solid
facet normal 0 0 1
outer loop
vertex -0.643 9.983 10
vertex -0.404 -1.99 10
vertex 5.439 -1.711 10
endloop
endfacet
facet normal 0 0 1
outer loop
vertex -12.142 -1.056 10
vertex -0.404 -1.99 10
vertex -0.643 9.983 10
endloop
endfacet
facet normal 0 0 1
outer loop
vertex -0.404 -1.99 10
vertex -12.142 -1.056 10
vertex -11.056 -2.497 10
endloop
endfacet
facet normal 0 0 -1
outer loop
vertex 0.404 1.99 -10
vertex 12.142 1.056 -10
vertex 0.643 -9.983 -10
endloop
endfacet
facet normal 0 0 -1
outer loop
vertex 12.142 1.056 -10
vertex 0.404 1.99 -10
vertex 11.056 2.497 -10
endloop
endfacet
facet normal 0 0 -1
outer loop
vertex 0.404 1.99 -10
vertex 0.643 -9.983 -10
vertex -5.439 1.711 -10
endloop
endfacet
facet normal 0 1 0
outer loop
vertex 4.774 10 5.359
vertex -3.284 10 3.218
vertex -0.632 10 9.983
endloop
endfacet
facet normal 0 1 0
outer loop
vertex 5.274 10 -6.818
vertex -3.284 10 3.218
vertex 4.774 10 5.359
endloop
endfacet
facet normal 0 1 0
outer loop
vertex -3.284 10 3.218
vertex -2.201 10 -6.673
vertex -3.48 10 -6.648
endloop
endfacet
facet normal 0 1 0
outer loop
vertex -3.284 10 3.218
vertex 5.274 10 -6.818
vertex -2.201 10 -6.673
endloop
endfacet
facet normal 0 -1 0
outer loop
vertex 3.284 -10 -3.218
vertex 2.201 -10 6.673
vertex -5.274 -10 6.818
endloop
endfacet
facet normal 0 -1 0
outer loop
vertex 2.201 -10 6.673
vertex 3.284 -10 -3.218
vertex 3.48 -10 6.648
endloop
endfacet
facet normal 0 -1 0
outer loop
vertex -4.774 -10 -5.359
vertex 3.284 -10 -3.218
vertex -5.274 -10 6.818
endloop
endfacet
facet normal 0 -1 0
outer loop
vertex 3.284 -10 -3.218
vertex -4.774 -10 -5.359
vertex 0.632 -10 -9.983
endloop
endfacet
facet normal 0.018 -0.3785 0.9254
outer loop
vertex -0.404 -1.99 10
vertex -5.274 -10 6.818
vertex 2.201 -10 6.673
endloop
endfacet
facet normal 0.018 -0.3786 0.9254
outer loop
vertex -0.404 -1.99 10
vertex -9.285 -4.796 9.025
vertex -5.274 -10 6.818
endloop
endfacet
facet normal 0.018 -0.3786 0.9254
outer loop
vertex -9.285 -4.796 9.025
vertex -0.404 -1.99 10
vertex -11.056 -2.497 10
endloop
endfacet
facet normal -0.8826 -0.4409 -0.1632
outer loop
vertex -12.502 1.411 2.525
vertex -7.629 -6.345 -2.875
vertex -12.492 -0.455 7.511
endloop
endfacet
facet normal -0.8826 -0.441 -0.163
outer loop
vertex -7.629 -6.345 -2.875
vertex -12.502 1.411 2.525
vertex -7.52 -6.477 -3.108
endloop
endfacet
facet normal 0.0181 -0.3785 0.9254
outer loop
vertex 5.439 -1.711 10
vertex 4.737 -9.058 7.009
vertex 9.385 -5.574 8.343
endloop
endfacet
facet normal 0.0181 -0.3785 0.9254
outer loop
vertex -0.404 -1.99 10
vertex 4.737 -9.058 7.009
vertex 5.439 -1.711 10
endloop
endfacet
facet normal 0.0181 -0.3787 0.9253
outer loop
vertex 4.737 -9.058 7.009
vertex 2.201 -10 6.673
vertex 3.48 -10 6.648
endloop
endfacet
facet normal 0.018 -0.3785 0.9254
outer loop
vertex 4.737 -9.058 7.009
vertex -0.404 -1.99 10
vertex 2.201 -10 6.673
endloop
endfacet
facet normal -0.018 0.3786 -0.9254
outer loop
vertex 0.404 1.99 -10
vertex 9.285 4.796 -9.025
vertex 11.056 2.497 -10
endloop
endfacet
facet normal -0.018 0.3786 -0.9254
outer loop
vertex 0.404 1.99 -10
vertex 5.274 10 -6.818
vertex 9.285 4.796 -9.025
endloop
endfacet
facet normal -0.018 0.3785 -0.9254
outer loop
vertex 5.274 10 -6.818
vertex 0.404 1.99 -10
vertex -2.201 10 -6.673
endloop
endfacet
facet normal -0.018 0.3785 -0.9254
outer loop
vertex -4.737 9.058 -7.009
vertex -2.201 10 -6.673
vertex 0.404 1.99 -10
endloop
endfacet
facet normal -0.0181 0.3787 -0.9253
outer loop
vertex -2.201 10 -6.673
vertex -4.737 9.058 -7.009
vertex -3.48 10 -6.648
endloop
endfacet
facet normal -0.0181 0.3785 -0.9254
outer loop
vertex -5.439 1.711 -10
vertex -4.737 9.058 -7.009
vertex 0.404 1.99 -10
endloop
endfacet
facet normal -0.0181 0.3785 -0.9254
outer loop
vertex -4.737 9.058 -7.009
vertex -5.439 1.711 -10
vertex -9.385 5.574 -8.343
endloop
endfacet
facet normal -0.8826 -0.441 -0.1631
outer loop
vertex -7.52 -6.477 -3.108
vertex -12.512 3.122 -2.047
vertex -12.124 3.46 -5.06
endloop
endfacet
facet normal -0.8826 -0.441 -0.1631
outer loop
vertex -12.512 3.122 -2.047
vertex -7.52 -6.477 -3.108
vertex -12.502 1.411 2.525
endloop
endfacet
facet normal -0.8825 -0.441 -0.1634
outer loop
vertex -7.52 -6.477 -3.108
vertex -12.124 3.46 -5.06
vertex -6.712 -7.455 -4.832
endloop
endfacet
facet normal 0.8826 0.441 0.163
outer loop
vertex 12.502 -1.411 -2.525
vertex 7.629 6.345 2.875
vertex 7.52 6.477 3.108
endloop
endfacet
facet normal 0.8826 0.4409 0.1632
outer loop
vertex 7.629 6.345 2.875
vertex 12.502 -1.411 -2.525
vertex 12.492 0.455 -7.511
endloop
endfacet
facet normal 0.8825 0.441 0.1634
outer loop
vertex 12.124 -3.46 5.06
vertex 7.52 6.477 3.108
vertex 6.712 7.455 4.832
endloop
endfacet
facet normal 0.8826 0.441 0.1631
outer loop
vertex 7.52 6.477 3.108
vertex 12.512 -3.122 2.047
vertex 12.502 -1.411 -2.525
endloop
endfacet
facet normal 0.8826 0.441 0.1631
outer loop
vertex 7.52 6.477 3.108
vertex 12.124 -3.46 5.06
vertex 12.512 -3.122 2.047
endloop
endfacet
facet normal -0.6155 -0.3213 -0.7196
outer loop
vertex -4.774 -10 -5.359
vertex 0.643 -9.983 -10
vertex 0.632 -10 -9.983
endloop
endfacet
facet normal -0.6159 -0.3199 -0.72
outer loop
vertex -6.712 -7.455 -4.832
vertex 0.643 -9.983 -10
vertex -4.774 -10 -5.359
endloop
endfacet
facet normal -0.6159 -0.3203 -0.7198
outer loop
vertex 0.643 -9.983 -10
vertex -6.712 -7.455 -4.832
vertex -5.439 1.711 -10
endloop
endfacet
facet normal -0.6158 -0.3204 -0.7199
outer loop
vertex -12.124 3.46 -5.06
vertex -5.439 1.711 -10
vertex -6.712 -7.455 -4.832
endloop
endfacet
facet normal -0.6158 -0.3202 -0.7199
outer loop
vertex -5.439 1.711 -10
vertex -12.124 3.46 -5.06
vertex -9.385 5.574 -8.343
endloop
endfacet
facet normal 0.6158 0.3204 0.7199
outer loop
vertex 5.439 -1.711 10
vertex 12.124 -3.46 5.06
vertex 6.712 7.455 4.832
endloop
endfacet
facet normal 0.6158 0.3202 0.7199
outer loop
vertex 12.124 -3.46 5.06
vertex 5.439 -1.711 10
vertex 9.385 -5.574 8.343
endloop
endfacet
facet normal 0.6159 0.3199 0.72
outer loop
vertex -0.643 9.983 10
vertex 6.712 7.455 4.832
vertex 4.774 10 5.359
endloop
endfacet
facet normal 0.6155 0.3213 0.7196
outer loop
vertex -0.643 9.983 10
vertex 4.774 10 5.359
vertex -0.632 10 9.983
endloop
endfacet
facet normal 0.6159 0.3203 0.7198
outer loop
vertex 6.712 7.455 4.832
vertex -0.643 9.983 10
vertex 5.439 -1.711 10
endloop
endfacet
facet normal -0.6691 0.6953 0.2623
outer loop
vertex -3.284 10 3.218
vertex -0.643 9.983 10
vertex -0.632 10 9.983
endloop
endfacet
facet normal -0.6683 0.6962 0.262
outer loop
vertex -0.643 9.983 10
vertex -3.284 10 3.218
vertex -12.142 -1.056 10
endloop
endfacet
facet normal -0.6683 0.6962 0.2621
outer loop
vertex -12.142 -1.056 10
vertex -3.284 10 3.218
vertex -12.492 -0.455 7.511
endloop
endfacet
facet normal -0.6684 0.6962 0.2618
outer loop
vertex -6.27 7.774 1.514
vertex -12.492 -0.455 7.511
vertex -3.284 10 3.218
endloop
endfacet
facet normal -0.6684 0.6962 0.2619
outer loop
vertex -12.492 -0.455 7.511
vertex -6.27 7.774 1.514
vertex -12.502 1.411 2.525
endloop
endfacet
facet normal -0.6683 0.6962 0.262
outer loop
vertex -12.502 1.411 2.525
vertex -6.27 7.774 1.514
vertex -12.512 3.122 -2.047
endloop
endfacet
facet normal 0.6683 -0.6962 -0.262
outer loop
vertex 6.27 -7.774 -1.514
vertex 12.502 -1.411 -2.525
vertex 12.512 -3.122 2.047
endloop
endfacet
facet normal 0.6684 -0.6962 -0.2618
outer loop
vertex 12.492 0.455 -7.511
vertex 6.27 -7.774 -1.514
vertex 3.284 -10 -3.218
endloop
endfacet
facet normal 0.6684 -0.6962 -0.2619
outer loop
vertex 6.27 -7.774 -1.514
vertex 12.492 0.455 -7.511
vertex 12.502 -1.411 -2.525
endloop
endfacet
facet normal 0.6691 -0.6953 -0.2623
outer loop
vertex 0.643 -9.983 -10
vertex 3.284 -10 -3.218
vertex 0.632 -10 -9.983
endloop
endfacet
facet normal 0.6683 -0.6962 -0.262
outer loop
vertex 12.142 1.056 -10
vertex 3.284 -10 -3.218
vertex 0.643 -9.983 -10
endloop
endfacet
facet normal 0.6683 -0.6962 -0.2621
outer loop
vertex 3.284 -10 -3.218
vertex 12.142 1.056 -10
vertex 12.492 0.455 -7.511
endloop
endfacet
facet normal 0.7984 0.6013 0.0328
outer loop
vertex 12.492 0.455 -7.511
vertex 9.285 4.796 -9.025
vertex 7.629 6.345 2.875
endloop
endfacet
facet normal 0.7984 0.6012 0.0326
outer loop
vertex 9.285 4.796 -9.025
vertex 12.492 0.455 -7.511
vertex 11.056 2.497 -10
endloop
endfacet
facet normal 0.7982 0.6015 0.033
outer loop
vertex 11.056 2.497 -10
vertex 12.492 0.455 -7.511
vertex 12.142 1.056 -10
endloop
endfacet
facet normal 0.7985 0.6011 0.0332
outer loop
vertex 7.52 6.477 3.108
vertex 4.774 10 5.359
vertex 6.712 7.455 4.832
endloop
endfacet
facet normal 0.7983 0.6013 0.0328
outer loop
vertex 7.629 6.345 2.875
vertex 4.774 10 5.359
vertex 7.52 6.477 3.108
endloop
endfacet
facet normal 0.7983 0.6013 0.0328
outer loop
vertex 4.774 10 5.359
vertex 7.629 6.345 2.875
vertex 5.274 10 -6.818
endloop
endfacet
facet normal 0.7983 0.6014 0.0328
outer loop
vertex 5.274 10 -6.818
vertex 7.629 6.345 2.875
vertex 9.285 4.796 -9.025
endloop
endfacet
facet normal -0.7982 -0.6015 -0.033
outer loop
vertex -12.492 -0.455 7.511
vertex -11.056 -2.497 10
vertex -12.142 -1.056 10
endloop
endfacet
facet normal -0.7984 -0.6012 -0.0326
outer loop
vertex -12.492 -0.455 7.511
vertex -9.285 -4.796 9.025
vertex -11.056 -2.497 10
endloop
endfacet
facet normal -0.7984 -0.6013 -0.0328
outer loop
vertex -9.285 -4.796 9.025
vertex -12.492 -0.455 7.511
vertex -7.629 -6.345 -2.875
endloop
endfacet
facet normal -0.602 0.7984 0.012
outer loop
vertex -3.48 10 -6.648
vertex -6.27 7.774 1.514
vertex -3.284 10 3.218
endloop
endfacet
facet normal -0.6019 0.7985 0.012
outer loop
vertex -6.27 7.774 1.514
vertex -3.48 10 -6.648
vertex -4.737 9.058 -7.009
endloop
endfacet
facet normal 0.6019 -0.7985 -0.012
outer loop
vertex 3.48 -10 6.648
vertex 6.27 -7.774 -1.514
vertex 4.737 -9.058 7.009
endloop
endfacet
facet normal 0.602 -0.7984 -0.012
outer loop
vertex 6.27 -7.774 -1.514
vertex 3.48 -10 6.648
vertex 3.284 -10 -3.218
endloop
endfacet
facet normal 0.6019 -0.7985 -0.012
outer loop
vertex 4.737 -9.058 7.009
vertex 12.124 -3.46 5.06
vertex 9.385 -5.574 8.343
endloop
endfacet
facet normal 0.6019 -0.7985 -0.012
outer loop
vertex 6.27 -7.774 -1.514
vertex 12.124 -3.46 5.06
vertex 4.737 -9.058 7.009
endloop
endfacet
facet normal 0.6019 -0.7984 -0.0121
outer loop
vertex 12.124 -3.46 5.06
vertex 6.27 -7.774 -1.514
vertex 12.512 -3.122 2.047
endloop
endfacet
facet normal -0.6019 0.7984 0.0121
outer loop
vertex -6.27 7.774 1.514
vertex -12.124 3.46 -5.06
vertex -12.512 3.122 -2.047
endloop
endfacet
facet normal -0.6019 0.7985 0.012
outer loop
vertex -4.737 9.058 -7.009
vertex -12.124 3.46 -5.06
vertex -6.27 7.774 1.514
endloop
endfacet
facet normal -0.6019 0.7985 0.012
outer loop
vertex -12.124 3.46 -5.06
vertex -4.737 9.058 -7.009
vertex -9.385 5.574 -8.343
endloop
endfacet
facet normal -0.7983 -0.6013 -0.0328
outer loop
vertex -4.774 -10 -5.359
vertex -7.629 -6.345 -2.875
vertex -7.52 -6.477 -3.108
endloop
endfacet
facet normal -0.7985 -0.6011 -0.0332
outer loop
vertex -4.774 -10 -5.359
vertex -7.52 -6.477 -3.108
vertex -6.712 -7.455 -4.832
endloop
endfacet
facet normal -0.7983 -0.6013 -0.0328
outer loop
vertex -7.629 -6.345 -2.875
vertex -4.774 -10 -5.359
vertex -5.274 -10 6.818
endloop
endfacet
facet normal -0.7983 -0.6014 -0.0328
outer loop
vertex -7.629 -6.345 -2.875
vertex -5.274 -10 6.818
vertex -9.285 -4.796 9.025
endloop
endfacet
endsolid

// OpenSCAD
// Volume: 5936.762827689681, SurfaceArea: 1781.028869460498
echo(version=version());

intersection_for(i = [
      [0, 0, 0],
      [10, 20, 300],
      [200, 40, 57],
      [20, 88, 57]
    ])
  rotate(i) cube([100, 20, 20], center = true);

// Written by Clifford Wolf <clifford@clifford.at> and Marius
// Kintel <marius@kintel.net>
//
// To the extent possible under law, the author(s) have dedicated all
// copyright and related and neighboring rights to this software to the
// public domain worldwide. This software is distributed without any
// warranty.
//
// You should have received a copy of the CC0 Public Domain
// Dedication along with this software.
// If not, see <http://creativecommons.org/publicdomain/zero/1.0/>.
